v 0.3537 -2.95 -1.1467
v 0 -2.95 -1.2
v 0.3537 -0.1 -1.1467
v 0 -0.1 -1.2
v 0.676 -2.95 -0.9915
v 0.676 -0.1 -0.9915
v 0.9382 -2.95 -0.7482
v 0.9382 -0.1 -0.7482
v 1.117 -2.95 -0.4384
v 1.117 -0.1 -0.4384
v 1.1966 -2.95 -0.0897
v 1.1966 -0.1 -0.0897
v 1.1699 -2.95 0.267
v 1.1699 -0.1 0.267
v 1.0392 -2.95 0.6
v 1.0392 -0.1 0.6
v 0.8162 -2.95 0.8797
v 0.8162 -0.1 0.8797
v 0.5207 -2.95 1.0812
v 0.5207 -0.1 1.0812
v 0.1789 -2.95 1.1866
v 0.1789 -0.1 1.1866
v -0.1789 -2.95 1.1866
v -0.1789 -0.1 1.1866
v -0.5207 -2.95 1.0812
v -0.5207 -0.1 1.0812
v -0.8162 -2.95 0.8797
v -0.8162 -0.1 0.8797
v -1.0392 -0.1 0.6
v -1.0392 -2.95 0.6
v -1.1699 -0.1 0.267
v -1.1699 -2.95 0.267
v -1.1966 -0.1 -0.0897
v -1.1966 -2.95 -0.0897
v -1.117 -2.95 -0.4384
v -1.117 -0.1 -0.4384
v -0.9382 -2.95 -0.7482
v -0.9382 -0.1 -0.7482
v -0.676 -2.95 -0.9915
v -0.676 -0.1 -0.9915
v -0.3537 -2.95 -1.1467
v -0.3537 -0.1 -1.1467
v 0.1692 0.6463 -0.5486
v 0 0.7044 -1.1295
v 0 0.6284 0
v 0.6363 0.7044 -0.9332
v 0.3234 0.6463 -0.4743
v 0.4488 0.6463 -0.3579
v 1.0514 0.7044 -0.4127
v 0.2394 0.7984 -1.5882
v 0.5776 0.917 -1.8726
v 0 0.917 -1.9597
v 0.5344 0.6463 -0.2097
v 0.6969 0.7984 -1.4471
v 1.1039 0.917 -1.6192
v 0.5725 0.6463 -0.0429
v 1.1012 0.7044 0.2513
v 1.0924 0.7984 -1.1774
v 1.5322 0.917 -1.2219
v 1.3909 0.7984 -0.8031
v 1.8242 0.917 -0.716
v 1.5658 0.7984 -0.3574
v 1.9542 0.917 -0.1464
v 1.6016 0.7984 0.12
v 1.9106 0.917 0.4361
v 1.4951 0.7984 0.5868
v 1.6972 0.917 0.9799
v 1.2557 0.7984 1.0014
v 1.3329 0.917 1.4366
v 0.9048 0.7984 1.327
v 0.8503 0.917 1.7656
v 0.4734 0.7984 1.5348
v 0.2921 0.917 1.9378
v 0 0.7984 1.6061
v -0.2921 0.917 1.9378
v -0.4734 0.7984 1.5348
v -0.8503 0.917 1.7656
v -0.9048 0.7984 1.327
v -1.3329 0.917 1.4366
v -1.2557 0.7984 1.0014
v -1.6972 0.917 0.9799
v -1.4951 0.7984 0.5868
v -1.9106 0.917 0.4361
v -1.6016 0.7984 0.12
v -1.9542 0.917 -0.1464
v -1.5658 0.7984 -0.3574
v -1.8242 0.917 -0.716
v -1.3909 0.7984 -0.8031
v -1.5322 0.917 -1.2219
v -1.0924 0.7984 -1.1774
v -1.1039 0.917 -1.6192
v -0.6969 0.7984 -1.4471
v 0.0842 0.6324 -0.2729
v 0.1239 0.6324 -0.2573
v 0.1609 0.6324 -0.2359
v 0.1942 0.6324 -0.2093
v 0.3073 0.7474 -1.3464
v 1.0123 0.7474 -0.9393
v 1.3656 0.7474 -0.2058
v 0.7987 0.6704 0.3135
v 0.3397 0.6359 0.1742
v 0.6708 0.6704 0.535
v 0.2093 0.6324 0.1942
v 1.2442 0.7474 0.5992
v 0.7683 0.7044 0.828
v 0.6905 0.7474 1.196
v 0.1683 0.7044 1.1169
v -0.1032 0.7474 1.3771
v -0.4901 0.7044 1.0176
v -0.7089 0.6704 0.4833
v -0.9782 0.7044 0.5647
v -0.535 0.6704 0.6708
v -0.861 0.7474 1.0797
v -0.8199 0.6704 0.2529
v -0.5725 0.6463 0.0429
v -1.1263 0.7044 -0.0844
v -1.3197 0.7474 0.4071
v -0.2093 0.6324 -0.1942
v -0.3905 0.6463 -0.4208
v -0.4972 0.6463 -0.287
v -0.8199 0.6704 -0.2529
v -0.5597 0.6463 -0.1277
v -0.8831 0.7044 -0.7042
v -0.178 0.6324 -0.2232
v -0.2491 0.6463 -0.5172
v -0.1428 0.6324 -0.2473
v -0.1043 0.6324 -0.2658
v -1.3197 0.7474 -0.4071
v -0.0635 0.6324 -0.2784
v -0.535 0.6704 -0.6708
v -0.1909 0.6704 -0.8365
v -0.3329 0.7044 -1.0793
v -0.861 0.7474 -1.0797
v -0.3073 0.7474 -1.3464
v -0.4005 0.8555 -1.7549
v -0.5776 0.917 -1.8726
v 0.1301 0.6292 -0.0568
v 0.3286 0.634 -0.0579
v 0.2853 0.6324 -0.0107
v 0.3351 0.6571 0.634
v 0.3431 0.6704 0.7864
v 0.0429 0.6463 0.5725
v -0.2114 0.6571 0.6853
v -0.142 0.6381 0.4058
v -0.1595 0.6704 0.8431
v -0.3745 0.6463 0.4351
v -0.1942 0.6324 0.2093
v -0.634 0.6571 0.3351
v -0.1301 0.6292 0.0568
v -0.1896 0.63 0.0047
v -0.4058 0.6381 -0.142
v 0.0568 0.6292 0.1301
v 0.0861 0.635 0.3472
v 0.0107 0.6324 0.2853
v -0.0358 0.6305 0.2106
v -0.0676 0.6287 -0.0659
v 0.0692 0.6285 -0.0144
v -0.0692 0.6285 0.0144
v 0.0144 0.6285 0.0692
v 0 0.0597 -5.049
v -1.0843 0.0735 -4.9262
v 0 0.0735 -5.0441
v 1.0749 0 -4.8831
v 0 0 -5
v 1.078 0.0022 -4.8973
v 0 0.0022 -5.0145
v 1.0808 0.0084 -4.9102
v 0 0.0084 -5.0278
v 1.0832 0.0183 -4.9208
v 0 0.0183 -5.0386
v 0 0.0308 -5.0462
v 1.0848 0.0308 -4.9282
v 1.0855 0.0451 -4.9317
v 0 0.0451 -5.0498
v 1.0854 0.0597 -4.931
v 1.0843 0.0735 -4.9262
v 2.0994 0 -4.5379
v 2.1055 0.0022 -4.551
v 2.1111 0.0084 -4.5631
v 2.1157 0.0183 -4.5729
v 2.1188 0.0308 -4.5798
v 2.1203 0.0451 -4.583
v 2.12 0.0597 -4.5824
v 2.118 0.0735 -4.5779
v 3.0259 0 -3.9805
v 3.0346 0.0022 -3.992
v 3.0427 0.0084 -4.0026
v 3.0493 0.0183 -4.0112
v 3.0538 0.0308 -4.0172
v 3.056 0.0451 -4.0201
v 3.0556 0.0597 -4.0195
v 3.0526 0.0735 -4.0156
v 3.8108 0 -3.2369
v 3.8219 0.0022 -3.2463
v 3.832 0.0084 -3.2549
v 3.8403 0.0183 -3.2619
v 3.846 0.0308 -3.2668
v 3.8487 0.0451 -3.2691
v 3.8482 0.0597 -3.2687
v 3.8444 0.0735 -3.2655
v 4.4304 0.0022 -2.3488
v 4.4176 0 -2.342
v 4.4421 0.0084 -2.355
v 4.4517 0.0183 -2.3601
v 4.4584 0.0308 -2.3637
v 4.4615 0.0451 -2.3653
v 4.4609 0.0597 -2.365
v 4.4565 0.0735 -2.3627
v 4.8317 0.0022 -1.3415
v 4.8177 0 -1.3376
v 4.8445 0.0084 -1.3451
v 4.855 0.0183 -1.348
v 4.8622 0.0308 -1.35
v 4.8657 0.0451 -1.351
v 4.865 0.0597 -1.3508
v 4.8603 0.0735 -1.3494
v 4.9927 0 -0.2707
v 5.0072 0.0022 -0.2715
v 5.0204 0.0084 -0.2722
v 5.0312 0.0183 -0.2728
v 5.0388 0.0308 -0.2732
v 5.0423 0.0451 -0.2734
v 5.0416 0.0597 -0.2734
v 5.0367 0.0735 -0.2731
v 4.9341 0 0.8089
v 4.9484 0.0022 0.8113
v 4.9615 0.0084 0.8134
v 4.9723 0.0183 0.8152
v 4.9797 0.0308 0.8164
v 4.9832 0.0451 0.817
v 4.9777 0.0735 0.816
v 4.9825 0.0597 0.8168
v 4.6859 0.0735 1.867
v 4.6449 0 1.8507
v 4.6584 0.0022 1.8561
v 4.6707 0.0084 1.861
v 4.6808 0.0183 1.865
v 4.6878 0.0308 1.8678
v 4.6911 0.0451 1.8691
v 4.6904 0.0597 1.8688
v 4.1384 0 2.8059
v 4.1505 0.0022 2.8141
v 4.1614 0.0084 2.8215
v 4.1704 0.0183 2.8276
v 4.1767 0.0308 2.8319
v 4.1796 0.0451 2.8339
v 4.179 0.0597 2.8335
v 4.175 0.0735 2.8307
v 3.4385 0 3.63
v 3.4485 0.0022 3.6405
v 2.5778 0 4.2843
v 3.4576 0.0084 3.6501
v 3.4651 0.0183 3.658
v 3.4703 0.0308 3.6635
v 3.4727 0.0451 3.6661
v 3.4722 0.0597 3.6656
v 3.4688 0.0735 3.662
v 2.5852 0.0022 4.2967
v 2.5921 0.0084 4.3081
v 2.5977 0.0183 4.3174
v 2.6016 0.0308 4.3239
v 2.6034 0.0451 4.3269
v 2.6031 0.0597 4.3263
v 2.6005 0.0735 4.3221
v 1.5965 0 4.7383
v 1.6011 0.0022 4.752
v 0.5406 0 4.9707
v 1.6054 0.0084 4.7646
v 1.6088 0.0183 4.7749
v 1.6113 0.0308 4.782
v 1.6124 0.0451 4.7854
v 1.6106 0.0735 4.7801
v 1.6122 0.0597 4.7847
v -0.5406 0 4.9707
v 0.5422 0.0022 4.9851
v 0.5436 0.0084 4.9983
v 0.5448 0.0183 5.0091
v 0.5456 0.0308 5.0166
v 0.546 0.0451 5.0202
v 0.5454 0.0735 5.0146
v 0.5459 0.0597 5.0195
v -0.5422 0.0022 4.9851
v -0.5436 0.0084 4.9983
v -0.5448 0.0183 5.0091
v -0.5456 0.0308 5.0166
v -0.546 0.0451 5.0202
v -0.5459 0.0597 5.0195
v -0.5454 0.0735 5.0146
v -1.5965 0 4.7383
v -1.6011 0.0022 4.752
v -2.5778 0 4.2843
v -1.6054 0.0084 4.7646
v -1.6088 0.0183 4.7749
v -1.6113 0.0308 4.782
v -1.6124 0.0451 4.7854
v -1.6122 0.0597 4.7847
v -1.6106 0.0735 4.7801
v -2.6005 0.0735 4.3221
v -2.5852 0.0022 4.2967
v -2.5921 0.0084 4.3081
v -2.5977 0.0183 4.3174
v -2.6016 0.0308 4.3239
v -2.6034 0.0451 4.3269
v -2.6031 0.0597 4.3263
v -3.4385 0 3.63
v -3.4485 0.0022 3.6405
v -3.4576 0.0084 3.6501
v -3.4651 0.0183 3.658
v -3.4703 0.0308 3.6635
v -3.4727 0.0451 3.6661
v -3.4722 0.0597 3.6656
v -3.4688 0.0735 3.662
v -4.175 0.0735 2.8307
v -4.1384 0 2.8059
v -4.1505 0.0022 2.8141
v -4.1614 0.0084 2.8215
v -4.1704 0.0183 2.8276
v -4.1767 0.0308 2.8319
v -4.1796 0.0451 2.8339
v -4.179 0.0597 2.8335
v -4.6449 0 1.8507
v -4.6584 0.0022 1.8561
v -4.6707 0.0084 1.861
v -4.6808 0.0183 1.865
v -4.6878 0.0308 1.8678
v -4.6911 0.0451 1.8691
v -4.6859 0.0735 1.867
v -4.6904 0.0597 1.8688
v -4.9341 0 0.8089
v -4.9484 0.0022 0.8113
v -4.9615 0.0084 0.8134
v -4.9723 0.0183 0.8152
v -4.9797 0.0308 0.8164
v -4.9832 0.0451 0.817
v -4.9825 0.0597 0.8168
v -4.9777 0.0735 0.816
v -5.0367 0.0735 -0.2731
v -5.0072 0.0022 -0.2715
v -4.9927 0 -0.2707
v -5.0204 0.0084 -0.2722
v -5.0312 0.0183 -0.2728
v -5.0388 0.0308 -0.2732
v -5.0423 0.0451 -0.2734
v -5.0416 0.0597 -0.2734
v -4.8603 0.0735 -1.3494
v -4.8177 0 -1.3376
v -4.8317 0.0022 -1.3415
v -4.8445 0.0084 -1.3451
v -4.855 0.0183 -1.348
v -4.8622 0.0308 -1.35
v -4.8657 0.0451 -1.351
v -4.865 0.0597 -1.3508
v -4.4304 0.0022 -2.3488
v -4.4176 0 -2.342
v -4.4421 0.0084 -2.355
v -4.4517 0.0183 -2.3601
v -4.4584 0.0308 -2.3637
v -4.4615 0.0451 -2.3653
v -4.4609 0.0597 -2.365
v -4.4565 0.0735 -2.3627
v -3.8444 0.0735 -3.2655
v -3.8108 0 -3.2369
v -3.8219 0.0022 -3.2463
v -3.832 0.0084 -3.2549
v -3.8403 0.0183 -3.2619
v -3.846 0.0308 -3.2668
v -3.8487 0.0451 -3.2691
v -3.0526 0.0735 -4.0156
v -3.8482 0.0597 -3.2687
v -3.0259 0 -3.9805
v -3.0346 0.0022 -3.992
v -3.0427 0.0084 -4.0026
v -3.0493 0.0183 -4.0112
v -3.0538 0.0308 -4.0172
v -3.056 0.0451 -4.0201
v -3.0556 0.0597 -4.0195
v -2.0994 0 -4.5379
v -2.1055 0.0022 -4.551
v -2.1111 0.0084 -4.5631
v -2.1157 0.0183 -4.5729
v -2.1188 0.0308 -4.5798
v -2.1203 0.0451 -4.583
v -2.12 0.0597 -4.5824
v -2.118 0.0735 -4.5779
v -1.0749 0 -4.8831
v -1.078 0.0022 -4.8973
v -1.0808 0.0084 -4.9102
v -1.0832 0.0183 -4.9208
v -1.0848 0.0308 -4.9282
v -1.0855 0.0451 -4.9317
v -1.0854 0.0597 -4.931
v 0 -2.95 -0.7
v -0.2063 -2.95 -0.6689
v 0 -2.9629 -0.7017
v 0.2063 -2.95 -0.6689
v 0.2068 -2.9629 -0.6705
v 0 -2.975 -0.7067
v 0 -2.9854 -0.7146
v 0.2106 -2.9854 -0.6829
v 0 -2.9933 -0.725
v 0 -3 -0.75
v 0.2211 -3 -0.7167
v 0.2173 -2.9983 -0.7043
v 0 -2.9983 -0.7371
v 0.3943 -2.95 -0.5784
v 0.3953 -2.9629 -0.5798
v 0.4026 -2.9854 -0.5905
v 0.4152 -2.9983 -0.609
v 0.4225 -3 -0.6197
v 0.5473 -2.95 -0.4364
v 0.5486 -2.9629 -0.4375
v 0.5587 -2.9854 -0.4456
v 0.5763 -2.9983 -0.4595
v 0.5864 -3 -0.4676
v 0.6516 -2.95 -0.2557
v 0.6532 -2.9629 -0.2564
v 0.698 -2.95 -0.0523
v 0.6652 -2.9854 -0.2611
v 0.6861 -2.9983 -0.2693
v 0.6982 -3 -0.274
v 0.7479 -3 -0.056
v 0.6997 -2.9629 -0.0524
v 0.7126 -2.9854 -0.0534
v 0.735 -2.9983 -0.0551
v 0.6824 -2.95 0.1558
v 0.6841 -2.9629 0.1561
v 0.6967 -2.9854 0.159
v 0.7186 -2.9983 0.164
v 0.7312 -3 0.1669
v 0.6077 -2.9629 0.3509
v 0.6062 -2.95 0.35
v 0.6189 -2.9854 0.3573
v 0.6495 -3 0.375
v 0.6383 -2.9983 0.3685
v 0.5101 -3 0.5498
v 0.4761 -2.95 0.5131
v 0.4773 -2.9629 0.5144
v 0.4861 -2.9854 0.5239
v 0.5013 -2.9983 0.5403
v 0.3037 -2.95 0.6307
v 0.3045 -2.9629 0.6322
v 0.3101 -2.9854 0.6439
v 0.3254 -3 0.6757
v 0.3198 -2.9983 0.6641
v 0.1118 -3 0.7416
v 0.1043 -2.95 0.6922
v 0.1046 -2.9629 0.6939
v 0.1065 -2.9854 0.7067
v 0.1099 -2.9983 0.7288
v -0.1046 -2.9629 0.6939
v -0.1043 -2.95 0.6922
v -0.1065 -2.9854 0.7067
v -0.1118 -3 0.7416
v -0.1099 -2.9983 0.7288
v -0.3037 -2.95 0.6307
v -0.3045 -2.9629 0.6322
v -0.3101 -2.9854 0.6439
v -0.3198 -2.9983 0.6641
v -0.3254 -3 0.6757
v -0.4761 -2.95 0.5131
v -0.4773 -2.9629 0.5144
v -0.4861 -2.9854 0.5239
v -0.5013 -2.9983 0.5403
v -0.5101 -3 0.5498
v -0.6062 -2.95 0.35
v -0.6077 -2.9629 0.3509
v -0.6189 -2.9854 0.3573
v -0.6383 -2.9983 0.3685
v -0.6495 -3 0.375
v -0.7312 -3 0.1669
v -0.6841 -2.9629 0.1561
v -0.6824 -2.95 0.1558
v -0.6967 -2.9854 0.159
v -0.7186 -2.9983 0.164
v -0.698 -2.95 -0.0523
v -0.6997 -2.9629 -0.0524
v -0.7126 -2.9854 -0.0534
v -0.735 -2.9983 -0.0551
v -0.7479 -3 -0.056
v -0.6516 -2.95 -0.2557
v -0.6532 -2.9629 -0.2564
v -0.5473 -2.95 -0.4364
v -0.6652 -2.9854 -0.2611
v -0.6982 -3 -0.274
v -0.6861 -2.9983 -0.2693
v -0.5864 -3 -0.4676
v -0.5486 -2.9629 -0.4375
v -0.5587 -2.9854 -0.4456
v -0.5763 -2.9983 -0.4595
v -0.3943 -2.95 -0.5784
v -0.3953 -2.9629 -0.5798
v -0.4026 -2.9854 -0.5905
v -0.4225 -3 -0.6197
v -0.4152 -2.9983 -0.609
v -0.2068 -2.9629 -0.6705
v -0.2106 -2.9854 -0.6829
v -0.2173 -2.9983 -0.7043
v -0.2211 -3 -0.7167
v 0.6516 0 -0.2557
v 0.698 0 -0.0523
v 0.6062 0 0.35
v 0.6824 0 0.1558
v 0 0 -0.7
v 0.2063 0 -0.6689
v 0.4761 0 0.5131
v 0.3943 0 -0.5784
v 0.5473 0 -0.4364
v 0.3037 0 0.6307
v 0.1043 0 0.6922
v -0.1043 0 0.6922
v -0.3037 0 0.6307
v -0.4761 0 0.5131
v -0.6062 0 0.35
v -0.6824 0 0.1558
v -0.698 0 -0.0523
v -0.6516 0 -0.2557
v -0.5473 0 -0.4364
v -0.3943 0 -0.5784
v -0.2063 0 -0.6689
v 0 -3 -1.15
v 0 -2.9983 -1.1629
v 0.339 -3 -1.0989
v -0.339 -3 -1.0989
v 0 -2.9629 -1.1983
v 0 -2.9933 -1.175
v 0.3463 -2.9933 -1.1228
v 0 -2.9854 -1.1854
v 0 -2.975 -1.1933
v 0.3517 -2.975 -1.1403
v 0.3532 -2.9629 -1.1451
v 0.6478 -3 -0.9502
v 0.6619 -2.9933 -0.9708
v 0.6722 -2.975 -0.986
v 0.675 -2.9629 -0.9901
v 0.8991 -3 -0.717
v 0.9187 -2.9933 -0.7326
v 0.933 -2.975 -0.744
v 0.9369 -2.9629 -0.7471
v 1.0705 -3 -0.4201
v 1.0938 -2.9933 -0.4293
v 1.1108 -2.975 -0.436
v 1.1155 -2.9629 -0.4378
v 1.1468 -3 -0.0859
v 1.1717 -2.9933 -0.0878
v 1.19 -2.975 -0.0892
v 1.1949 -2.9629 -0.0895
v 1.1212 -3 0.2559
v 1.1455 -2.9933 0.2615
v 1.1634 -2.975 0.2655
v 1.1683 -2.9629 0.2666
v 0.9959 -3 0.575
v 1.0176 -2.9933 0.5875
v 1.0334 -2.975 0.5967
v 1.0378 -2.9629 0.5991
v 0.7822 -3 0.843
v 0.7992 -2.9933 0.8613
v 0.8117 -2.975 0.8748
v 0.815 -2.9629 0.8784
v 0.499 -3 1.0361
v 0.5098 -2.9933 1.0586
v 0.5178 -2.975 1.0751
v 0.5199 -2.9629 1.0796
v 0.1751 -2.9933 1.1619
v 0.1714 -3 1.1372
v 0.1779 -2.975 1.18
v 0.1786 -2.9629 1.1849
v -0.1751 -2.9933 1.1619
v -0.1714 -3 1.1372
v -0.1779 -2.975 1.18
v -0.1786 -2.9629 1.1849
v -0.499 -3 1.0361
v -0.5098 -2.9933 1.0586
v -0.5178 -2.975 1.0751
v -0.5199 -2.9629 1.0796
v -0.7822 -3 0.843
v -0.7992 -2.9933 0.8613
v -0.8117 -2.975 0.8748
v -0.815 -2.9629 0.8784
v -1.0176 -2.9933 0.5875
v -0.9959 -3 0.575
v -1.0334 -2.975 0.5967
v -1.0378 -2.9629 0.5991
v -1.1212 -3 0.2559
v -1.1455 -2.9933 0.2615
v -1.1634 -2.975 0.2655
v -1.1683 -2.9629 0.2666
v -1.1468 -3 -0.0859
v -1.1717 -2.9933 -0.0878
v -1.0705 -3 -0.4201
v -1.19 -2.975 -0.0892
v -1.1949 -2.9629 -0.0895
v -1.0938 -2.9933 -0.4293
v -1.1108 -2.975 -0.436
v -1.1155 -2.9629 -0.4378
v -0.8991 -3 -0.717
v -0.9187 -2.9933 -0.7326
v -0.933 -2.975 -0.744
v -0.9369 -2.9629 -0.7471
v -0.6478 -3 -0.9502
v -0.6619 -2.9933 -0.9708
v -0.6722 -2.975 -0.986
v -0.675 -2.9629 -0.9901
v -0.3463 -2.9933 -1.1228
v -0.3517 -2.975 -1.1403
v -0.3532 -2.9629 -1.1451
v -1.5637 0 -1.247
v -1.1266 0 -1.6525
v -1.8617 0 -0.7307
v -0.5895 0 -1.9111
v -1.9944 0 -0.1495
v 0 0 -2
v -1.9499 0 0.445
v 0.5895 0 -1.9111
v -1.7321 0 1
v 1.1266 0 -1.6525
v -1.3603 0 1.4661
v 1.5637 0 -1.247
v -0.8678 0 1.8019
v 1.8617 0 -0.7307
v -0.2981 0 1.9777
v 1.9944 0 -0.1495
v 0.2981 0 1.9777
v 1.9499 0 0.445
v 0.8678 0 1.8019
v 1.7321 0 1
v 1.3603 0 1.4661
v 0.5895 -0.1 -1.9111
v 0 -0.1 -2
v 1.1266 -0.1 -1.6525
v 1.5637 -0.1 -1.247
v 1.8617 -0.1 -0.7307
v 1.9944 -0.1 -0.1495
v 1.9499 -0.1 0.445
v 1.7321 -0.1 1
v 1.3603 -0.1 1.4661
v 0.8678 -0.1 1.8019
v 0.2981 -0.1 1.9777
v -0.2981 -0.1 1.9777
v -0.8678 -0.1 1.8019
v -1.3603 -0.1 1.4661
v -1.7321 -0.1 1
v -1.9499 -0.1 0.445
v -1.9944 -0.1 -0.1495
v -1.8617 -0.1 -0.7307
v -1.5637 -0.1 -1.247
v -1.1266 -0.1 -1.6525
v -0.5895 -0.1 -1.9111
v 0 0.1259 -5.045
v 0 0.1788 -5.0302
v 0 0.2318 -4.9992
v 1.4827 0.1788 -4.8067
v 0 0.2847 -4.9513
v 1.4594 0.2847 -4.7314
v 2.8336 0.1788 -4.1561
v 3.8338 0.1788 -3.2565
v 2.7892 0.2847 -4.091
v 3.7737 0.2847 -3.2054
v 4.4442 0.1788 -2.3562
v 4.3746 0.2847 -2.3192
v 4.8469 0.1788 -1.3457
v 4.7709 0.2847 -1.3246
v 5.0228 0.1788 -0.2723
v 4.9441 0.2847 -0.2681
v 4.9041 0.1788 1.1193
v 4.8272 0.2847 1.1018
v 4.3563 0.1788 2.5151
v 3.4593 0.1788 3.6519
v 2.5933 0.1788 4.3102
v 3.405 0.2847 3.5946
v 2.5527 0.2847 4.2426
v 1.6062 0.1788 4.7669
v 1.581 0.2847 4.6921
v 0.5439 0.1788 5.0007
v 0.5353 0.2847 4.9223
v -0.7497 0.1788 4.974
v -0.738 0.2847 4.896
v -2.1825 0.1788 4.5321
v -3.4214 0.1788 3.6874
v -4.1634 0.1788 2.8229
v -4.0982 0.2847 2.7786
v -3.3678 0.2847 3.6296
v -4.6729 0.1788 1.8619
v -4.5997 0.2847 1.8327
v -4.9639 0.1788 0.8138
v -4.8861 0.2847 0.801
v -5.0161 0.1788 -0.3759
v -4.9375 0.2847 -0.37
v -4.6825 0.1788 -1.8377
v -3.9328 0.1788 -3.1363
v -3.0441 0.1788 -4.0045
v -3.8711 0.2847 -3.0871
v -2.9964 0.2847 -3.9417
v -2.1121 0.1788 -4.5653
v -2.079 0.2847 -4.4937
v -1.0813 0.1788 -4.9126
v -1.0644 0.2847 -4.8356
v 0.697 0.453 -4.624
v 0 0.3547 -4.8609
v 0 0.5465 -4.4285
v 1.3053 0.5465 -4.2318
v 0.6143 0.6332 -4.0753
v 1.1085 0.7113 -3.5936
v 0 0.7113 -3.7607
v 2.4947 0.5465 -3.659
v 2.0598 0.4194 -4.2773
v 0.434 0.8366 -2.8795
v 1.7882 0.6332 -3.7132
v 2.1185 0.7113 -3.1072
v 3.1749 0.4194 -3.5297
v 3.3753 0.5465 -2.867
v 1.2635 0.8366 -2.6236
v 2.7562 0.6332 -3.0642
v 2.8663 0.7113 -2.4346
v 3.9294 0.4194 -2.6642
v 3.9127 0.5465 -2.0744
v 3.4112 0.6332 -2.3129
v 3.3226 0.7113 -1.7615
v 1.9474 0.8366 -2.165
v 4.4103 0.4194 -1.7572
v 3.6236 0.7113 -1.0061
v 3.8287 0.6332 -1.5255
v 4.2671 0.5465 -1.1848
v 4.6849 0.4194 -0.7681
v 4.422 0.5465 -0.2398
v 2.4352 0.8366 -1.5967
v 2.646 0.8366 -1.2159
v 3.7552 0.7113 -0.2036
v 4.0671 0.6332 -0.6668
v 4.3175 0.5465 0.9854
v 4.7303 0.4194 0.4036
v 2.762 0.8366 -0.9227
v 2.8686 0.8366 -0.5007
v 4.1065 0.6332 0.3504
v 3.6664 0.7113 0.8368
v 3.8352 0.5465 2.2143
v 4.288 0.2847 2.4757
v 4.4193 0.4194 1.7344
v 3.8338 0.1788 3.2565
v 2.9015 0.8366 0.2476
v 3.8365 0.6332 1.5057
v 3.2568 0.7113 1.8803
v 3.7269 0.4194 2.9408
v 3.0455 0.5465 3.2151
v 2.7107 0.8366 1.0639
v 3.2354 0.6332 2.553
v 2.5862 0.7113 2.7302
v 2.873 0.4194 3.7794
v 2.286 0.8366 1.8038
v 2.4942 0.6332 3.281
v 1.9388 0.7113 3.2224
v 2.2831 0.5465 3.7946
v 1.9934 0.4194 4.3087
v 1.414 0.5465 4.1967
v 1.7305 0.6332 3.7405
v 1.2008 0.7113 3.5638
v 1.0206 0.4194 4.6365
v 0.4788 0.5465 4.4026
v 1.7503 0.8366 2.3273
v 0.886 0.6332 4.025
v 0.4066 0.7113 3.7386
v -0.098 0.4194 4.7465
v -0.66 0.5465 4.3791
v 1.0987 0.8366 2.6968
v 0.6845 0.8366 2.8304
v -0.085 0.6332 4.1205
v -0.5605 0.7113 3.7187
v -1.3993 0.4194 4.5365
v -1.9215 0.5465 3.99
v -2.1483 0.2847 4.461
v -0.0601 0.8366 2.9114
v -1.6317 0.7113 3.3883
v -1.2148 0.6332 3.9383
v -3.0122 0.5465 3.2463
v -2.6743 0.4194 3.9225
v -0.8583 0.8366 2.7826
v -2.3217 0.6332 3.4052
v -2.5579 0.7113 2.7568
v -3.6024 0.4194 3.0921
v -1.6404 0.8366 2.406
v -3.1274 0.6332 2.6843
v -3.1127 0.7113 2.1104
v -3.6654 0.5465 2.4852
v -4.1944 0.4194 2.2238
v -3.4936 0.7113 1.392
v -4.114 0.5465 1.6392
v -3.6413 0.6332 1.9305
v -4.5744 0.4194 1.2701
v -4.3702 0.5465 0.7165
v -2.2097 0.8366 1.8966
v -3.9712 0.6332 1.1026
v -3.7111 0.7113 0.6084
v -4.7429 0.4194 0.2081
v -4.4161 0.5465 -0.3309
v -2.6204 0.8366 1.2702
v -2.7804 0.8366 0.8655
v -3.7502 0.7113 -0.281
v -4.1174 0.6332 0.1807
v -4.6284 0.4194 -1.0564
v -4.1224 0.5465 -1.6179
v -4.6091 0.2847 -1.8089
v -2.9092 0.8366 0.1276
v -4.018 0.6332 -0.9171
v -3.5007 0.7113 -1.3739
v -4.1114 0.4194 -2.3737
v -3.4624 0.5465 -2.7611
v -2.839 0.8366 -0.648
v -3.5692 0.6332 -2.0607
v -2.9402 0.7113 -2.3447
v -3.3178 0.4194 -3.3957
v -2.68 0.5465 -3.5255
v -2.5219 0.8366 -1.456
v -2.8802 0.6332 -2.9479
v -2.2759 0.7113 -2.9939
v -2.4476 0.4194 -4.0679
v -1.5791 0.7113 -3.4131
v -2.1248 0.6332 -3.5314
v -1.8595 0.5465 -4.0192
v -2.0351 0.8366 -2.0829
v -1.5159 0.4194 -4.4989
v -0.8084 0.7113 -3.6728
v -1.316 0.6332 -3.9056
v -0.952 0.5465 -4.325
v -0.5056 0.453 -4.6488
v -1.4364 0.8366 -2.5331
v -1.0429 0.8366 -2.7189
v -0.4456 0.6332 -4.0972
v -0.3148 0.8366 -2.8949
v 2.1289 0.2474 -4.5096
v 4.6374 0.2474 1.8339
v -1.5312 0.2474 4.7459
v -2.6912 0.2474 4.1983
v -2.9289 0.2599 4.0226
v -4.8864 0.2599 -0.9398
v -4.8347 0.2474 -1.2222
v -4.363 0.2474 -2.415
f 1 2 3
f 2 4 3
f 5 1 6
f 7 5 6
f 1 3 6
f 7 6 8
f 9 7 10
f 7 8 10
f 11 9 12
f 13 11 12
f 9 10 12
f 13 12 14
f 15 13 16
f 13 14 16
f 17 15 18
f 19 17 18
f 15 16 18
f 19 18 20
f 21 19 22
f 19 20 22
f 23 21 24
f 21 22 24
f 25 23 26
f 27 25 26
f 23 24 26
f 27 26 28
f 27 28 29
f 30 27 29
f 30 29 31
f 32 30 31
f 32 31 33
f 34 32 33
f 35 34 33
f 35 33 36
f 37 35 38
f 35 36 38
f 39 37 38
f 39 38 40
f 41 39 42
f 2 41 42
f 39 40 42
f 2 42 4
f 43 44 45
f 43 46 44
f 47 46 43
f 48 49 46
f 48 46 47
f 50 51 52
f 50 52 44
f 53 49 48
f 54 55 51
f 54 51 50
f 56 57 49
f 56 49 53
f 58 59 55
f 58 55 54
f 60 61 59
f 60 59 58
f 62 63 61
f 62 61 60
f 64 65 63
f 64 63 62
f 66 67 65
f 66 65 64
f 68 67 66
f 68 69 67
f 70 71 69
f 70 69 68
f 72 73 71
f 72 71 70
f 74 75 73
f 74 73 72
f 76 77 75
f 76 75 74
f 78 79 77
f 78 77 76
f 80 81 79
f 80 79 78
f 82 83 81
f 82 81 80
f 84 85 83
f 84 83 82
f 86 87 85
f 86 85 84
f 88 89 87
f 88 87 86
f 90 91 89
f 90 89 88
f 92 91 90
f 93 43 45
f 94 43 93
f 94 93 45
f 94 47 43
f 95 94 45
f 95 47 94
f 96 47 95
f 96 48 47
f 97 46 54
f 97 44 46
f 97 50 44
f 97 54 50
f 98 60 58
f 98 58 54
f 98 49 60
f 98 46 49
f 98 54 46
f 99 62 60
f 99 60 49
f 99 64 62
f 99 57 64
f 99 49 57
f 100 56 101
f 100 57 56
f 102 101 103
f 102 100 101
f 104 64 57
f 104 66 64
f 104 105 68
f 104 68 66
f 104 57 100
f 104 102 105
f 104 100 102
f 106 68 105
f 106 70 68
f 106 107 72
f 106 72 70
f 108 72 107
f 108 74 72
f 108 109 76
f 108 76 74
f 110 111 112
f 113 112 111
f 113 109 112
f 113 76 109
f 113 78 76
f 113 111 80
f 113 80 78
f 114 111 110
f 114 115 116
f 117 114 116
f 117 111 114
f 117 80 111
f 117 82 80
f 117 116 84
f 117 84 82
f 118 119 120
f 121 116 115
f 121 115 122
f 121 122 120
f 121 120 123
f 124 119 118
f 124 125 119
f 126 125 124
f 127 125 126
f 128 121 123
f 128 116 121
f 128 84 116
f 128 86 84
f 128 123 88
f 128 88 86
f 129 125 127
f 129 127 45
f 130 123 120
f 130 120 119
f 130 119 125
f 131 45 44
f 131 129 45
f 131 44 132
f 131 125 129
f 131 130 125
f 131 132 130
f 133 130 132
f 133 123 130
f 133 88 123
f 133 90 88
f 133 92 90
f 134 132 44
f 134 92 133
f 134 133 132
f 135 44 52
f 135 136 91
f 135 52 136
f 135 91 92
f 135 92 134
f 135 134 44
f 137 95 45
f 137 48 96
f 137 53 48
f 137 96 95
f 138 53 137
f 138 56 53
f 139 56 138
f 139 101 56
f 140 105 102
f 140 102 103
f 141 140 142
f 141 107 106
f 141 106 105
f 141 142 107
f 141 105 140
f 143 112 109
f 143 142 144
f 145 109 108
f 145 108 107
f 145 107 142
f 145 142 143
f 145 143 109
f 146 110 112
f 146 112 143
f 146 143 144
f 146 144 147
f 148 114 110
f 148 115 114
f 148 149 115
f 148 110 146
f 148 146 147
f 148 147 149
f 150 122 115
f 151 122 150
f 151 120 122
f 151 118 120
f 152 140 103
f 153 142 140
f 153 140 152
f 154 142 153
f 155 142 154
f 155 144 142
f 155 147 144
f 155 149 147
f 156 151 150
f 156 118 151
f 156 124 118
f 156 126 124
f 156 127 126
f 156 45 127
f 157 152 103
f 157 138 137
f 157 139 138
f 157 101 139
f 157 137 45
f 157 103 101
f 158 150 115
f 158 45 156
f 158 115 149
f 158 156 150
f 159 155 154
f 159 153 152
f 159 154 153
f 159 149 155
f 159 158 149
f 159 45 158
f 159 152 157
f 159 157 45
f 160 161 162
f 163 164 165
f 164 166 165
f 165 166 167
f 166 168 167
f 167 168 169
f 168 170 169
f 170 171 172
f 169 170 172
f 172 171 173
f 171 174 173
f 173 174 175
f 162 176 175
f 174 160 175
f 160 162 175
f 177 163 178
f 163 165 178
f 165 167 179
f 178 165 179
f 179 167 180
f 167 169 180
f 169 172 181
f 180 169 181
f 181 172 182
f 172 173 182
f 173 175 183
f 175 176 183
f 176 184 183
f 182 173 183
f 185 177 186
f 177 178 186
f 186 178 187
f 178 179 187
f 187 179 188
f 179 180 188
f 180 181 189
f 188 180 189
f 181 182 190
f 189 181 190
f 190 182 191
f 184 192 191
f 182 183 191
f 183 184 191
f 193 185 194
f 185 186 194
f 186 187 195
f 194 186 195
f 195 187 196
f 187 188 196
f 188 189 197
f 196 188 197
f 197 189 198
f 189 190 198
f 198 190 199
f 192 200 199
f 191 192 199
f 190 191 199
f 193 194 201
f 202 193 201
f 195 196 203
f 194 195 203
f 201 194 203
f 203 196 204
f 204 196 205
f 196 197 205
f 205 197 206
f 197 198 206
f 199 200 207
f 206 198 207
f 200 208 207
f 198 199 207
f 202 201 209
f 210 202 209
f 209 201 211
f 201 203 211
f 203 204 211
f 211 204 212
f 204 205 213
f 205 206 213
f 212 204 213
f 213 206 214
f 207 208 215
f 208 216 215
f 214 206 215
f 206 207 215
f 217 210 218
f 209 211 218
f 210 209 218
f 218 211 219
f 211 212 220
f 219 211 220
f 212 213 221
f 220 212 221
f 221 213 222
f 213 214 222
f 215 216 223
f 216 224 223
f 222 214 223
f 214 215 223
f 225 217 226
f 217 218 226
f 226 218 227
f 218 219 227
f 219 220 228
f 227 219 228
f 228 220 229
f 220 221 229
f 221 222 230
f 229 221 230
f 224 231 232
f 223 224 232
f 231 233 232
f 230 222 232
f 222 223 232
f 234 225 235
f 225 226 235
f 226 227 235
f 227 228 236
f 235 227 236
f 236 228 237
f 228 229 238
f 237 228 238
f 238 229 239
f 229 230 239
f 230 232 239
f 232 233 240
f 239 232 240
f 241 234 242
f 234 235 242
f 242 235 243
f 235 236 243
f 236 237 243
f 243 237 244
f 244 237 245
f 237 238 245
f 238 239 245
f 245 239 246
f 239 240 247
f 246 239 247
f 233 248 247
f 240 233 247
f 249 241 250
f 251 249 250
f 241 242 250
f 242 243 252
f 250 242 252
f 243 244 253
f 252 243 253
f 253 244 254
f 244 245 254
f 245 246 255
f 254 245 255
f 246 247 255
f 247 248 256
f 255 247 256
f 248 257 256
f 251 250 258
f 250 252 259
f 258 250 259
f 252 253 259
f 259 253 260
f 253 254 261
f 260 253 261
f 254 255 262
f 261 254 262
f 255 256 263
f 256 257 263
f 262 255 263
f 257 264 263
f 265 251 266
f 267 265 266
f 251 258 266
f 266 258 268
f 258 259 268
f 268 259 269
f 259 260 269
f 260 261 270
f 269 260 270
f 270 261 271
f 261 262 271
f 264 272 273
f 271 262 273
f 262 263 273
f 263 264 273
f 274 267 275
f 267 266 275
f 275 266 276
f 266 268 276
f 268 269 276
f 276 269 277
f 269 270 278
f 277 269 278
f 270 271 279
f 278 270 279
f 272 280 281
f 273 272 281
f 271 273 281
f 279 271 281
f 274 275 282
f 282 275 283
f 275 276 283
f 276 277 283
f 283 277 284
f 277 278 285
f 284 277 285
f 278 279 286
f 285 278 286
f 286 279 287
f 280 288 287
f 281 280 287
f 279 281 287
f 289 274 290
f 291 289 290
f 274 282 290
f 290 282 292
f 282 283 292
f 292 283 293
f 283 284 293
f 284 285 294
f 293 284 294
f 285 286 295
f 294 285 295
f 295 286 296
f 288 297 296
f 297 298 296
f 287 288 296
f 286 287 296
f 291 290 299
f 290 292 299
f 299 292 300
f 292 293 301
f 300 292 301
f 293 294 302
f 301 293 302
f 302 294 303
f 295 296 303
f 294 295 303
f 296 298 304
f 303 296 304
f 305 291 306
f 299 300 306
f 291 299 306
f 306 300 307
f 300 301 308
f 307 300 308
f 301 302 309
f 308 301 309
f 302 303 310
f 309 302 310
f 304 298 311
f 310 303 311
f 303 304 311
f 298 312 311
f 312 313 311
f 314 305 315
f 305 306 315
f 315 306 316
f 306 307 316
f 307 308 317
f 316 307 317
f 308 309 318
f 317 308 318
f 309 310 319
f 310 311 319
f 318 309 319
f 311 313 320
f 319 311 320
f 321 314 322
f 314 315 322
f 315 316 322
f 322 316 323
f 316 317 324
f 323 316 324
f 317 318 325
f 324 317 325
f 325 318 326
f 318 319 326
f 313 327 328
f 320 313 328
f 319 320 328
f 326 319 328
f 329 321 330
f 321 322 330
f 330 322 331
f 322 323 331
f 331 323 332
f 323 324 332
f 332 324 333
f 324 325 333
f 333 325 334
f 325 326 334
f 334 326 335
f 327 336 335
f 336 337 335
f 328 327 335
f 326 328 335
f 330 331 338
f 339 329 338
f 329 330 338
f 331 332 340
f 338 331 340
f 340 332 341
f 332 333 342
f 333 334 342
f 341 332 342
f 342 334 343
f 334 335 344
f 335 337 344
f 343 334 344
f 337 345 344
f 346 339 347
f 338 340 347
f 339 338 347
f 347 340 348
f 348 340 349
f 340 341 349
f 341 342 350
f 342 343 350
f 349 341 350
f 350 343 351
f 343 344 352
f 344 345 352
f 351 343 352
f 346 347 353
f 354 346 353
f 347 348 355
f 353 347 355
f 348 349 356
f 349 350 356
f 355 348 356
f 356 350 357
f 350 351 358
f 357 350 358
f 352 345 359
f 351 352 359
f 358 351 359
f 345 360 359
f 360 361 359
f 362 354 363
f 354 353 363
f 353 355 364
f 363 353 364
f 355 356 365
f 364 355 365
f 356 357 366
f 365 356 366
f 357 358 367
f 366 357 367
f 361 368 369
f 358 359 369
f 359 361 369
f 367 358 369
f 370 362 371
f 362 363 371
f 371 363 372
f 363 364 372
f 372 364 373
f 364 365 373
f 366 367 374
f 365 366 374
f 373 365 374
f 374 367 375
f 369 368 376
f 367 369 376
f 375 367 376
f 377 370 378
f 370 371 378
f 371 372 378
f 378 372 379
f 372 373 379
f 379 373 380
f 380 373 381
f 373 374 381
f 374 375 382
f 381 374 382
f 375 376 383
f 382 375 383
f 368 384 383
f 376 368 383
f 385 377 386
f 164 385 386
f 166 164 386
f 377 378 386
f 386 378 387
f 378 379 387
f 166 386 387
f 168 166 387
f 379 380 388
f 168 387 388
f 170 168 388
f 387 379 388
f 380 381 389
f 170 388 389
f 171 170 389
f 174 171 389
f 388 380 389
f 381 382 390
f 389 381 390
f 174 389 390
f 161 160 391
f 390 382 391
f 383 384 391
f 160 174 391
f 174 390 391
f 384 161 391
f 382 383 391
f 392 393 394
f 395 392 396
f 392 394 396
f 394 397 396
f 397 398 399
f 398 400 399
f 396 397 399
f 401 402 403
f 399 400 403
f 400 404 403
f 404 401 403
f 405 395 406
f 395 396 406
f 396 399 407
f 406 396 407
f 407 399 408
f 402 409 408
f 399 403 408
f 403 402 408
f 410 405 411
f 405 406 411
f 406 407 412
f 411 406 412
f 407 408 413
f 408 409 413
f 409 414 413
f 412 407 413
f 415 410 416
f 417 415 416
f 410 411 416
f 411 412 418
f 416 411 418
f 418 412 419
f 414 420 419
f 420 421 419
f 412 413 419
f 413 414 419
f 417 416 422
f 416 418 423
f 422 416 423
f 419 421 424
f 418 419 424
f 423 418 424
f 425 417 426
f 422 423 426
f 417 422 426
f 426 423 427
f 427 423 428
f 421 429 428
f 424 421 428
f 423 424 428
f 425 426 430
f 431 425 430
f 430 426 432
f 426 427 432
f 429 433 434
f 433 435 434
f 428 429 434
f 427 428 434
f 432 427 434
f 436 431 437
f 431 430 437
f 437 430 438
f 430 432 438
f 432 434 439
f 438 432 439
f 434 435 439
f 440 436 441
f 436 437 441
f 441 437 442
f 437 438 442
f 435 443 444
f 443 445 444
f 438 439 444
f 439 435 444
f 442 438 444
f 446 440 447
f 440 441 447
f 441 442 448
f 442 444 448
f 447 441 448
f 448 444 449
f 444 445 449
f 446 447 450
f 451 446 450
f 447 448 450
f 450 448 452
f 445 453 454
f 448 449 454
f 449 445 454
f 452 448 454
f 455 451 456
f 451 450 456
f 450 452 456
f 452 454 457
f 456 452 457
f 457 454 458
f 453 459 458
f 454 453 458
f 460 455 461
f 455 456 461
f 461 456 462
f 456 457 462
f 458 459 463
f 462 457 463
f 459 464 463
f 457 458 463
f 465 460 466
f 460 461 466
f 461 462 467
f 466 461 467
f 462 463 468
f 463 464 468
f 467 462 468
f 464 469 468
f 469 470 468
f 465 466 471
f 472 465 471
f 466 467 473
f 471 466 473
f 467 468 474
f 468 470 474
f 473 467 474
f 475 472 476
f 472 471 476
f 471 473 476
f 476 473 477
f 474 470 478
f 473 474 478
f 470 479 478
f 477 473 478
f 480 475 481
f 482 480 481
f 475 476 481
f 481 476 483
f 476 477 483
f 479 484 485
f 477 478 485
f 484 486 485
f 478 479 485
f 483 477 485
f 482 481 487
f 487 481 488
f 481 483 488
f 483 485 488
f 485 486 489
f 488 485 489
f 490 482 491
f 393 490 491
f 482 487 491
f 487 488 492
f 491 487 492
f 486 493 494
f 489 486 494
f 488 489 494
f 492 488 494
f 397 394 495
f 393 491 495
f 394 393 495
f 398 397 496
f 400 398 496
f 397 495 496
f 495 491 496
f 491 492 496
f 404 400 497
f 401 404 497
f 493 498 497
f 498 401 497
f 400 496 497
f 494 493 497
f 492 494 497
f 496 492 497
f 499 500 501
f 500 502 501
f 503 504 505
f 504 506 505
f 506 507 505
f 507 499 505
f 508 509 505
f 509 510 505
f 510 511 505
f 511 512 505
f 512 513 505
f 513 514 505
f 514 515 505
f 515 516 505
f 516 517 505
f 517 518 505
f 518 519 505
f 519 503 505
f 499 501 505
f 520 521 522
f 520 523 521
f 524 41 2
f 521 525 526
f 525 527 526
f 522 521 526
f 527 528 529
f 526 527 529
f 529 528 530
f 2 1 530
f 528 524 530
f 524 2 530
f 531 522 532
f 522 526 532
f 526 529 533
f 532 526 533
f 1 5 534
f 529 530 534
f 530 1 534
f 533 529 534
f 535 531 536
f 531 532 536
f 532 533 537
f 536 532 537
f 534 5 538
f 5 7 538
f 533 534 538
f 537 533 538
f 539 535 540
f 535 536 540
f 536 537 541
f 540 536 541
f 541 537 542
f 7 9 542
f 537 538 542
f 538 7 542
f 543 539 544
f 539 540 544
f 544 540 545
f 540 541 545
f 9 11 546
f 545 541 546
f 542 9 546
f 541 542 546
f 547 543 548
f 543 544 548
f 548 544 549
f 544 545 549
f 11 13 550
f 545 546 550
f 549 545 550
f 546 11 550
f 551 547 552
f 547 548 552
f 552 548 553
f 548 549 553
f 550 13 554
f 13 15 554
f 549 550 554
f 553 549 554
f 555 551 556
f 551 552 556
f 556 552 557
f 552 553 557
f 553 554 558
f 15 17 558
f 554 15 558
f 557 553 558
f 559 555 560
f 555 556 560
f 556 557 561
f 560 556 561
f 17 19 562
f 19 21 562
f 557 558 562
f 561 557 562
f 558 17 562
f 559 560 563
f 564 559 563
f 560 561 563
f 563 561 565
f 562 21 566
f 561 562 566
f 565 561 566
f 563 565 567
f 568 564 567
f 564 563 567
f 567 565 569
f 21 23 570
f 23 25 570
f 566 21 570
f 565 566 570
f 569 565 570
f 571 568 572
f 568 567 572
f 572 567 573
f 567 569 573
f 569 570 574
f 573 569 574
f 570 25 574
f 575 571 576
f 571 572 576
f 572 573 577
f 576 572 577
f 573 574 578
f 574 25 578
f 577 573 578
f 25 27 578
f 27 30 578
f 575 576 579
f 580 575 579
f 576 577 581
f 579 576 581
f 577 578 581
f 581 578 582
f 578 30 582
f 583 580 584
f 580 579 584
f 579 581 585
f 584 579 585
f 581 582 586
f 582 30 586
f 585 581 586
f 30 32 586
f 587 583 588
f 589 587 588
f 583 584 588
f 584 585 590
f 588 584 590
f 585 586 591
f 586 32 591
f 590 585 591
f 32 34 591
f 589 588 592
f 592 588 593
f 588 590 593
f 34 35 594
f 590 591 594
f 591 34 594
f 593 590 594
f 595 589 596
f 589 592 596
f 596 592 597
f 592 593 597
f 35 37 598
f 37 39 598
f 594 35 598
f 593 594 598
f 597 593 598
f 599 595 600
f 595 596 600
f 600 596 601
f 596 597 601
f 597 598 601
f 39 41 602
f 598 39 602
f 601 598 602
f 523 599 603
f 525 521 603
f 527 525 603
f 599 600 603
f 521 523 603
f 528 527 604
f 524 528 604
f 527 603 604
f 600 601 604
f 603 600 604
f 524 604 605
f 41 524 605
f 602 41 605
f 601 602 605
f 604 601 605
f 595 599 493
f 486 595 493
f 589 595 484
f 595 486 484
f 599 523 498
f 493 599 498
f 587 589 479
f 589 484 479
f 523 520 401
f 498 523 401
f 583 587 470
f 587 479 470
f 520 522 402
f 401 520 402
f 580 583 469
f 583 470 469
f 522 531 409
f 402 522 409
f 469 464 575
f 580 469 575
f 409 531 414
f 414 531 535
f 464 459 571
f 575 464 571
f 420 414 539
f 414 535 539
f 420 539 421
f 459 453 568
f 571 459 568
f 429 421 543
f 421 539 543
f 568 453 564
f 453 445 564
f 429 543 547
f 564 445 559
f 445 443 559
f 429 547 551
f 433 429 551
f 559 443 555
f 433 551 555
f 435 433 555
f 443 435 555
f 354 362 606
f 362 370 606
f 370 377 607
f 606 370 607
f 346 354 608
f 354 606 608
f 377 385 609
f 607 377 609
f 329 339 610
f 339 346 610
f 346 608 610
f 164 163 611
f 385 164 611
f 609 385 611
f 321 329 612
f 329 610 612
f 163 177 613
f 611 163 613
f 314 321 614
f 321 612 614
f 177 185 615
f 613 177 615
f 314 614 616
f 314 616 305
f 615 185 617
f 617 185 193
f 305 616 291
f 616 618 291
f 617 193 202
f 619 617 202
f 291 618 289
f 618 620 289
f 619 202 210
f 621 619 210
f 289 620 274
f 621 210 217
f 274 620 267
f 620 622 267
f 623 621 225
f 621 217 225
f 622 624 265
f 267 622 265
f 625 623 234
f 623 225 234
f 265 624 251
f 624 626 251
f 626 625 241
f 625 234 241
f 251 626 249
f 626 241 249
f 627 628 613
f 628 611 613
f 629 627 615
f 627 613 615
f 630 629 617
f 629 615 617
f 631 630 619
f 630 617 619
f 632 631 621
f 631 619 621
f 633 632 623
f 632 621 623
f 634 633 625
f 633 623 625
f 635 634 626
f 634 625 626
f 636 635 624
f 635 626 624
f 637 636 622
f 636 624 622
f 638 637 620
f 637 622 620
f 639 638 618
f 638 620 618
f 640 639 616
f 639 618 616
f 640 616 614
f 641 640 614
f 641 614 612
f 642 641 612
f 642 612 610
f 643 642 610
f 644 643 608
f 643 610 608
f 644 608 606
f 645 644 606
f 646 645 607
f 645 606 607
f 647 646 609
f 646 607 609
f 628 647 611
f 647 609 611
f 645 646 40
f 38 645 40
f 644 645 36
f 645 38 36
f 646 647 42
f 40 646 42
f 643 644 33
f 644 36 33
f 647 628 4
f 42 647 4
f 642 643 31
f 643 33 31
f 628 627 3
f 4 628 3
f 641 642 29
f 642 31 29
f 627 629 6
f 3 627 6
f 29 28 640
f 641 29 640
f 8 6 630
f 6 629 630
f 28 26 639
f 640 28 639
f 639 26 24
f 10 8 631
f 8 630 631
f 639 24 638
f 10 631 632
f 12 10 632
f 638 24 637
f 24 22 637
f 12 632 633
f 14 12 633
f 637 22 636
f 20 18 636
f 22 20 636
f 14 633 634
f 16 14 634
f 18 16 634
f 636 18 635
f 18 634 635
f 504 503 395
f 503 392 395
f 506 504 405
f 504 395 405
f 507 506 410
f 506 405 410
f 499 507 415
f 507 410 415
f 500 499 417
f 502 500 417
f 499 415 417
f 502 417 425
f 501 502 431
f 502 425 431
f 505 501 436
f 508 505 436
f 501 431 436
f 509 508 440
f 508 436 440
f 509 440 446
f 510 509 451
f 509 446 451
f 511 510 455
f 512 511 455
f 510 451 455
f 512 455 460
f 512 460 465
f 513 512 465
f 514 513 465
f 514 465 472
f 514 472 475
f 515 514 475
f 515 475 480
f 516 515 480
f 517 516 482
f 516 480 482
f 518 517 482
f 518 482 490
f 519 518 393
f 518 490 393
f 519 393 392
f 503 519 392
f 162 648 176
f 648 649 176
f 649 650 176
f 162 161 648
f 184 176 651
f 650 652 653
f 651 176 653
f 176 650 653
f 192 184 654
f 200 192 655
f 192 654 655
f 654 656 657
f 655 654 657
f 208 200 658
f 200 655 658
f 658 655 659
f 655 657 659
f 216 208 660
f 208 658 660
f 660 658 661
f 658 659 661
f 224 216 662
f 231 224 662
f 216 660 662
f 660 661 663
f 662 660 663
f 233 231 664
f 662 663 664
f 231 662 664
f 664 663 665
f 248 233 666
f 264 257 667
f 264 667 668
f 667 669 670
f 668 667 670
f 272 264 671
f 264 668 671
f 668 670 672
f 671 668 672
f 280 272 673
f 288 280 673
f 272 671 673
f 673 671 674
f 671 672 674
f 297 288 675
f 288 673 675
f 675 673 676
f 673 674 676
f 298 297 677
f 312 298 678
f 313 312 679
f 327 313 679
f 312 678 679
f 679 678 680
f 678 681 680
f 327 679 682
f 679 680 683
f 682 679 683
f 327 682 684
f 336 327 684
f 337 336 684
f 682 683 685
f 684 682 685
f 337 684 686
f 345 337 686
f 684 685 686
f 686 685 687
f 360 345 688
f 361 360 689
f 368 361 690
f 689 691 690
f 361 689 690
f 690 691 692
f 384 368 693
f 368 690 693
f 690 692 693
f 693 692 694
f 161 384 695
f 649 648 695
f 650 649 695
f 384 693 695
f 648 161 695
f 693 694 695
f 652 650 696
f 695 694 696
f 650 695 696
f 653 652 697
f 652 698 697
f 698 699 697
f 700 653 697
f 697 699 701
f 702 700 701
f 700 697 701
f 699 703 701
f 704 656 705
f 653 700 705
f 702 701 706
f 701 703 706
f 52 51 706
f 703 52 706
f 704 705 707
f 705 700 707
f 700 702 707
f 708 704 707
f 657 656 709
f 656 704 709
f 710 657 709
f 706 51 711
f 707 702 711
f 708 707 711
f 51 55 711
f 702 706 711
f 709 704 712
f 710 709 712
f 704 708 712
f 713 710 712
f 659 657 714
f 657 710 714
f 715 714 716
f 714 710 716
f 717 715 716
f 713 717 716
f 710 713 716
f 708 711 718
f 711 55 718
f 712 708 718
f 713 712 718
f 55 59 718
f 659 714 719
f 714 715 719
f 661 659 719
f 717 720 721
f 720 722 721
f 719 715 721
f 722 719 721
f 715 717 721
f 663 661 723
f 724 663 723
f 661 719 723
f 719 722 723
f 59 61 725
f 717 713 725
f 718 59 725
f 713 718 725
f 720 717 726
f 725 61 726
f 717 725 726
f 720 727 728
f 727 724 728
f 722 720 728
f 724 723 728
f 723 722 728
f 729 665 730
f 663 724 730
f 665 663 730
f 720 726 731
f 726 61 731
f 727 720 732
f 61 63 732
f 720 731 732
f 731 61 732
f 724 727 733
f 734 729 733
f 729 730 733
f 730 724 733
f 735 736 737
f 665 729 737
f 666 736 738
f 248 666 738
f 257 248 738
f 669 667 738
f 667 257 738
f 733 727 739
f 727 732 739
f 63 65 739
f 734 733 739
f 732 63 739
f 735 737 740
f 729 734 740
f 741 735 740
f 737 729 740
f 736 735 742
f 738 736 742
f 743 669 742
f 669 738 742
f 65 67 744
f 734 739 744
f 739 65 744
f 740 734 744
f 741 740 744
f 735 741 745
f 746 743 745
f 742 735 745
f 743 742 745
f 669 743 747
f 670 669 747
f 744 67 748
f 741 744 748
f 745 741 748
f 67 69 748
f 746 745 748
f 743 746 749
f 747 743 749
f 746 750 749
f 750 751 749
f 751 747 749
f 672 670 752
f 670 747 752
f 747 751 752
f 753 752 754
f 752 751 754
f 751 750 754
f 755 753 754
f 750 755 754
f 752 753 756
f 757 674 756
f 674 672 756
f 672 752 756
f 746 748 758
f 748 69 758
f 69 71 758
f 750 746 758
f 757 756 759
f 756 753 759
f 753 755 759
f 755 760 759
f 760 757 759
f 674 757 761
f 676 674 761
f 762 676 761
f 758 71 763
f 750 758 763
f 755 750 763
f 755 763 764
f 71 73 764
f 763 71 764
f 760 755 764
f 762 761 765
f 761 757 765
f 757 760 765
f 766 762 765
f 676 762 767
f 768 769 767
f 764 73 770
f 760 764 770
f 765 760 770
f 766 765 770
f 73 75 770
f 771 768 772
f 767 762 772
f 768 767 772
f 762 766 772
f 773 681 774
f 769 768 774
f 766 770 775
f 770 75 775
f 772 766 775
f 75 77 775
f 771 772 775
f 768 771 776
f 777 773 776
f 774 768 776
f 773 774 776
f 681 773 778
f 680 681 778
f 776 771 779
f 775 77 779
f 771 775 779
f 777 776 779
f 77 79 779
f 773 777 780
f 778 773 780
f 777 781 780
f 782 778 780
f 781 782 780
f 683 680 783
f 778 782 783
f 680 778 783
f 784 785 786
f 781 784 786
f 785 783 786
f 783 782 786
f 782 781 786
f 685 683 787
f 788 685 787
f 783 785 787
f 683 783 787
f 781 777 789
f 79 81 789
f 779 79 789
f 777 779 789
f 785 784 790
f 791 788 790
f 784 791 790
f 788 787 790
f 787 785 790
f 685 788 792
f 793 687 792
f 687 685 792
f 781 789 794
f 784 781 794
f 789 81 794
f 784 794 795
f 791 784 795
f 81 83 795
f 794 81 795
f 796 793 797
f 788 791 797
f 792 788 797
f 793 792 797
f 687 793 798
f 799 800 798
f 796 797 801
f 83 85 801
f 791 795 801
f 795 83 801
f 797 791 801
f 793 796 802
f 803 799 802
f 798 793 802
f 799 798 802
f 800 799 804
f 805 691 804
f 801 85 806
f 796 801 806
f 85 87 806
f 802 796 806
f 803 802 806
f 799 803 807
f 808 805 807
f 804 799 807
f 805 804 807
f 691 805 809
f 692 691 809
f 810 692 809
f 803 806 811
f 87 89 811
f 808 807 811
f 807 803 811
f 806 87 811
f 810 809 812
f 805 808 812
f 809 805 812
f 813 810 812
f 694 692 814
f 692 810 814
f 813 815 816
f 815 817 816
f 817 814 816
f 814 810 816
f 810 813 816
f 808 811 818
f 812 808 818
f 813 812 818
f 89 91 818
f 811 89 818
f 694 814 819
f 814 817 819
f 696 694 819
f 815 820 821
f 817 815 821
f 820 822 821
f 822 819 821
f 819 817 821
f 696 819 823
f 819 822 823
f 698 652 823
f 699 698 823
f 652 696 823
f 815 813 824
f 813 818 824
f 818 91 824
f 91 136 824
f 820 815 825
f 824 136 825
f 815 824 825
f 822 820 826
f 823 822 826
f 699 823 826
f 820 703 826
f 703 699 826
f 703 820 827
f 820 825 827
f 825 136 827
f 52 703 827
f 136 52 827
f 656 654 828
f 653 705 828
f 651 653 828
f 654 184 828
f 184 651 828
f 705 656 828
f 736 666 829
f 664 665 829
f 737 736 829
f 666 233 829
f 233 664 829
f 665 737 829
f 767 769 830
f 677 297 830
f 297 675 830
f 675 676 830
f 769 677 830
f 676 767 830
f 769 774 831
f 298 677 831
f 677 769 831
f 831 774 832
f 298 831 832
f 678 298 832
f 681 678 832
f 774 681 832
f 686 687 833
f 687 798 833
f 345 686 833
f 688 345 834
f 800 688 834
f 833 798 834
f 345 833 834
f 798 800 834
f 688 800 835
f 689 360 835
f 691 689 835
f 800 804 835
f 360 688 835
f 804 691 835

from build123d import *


with BuildPart() as part:
    # Sketch1 → Revolve1 (revolve)
    with BuildSketch(Plane(origin=(0, 0, 0), x_dir=(0, 0, -1), z_dir=(1, 0, 0))):
        with BuildLine():
            Line((0, 0), (0.7, 0))
            Line((0.7, 0), (0.7, -2.95))
            ThreePointArc((0.7, -2.95), (0.714644661, -2.985355339), (0.75, -3))
            Line((0.75, -3), (1.15, -3))
            ThreePointArc((1.15, -3), (1.185355339, -2.985355339), (1.2, -2.95))
            Line((1.2, -2.95), (1.2, -0.1))
            Line((1.2, -0.1), (2, -0.1))
            Line((2, -0.1), (2, 0))
            Line((2, 0), (5, 0))
            ThreePointArc((5, 0), (5.042871169, 0.024269418), (5.044124005, 0.073517487))
            add(Edge.make_bspline(
                [(5.044124005, 0.073517487), (5.150084824, 0.728367306), (1.959714512, 0.917022897)],
                knots=[6.248596197, 6.248596197, 6.248596197, 7.451182248, 7.451182248, 7.451182248], degree=2, weights=[1, 0.824604828, 1]))
            add(Edge.make_bspline(
                [(0, 0.628352907), (1.302459015, 0.625404776), (1.959714512, 0.917022897)],
                knots=[4.703660792, 4.703660792, 4.703660792, 5.754258139, 5.754258139, 5.754258139], degree=2, weights=[1, 0.865174204, 1]))
            Line((0, 0.628352907), (0, 0))
        make_face()
    revolve(axis=Axis((0, 0.628352907, 0), (0, -1, 0)))


solid = part.part
